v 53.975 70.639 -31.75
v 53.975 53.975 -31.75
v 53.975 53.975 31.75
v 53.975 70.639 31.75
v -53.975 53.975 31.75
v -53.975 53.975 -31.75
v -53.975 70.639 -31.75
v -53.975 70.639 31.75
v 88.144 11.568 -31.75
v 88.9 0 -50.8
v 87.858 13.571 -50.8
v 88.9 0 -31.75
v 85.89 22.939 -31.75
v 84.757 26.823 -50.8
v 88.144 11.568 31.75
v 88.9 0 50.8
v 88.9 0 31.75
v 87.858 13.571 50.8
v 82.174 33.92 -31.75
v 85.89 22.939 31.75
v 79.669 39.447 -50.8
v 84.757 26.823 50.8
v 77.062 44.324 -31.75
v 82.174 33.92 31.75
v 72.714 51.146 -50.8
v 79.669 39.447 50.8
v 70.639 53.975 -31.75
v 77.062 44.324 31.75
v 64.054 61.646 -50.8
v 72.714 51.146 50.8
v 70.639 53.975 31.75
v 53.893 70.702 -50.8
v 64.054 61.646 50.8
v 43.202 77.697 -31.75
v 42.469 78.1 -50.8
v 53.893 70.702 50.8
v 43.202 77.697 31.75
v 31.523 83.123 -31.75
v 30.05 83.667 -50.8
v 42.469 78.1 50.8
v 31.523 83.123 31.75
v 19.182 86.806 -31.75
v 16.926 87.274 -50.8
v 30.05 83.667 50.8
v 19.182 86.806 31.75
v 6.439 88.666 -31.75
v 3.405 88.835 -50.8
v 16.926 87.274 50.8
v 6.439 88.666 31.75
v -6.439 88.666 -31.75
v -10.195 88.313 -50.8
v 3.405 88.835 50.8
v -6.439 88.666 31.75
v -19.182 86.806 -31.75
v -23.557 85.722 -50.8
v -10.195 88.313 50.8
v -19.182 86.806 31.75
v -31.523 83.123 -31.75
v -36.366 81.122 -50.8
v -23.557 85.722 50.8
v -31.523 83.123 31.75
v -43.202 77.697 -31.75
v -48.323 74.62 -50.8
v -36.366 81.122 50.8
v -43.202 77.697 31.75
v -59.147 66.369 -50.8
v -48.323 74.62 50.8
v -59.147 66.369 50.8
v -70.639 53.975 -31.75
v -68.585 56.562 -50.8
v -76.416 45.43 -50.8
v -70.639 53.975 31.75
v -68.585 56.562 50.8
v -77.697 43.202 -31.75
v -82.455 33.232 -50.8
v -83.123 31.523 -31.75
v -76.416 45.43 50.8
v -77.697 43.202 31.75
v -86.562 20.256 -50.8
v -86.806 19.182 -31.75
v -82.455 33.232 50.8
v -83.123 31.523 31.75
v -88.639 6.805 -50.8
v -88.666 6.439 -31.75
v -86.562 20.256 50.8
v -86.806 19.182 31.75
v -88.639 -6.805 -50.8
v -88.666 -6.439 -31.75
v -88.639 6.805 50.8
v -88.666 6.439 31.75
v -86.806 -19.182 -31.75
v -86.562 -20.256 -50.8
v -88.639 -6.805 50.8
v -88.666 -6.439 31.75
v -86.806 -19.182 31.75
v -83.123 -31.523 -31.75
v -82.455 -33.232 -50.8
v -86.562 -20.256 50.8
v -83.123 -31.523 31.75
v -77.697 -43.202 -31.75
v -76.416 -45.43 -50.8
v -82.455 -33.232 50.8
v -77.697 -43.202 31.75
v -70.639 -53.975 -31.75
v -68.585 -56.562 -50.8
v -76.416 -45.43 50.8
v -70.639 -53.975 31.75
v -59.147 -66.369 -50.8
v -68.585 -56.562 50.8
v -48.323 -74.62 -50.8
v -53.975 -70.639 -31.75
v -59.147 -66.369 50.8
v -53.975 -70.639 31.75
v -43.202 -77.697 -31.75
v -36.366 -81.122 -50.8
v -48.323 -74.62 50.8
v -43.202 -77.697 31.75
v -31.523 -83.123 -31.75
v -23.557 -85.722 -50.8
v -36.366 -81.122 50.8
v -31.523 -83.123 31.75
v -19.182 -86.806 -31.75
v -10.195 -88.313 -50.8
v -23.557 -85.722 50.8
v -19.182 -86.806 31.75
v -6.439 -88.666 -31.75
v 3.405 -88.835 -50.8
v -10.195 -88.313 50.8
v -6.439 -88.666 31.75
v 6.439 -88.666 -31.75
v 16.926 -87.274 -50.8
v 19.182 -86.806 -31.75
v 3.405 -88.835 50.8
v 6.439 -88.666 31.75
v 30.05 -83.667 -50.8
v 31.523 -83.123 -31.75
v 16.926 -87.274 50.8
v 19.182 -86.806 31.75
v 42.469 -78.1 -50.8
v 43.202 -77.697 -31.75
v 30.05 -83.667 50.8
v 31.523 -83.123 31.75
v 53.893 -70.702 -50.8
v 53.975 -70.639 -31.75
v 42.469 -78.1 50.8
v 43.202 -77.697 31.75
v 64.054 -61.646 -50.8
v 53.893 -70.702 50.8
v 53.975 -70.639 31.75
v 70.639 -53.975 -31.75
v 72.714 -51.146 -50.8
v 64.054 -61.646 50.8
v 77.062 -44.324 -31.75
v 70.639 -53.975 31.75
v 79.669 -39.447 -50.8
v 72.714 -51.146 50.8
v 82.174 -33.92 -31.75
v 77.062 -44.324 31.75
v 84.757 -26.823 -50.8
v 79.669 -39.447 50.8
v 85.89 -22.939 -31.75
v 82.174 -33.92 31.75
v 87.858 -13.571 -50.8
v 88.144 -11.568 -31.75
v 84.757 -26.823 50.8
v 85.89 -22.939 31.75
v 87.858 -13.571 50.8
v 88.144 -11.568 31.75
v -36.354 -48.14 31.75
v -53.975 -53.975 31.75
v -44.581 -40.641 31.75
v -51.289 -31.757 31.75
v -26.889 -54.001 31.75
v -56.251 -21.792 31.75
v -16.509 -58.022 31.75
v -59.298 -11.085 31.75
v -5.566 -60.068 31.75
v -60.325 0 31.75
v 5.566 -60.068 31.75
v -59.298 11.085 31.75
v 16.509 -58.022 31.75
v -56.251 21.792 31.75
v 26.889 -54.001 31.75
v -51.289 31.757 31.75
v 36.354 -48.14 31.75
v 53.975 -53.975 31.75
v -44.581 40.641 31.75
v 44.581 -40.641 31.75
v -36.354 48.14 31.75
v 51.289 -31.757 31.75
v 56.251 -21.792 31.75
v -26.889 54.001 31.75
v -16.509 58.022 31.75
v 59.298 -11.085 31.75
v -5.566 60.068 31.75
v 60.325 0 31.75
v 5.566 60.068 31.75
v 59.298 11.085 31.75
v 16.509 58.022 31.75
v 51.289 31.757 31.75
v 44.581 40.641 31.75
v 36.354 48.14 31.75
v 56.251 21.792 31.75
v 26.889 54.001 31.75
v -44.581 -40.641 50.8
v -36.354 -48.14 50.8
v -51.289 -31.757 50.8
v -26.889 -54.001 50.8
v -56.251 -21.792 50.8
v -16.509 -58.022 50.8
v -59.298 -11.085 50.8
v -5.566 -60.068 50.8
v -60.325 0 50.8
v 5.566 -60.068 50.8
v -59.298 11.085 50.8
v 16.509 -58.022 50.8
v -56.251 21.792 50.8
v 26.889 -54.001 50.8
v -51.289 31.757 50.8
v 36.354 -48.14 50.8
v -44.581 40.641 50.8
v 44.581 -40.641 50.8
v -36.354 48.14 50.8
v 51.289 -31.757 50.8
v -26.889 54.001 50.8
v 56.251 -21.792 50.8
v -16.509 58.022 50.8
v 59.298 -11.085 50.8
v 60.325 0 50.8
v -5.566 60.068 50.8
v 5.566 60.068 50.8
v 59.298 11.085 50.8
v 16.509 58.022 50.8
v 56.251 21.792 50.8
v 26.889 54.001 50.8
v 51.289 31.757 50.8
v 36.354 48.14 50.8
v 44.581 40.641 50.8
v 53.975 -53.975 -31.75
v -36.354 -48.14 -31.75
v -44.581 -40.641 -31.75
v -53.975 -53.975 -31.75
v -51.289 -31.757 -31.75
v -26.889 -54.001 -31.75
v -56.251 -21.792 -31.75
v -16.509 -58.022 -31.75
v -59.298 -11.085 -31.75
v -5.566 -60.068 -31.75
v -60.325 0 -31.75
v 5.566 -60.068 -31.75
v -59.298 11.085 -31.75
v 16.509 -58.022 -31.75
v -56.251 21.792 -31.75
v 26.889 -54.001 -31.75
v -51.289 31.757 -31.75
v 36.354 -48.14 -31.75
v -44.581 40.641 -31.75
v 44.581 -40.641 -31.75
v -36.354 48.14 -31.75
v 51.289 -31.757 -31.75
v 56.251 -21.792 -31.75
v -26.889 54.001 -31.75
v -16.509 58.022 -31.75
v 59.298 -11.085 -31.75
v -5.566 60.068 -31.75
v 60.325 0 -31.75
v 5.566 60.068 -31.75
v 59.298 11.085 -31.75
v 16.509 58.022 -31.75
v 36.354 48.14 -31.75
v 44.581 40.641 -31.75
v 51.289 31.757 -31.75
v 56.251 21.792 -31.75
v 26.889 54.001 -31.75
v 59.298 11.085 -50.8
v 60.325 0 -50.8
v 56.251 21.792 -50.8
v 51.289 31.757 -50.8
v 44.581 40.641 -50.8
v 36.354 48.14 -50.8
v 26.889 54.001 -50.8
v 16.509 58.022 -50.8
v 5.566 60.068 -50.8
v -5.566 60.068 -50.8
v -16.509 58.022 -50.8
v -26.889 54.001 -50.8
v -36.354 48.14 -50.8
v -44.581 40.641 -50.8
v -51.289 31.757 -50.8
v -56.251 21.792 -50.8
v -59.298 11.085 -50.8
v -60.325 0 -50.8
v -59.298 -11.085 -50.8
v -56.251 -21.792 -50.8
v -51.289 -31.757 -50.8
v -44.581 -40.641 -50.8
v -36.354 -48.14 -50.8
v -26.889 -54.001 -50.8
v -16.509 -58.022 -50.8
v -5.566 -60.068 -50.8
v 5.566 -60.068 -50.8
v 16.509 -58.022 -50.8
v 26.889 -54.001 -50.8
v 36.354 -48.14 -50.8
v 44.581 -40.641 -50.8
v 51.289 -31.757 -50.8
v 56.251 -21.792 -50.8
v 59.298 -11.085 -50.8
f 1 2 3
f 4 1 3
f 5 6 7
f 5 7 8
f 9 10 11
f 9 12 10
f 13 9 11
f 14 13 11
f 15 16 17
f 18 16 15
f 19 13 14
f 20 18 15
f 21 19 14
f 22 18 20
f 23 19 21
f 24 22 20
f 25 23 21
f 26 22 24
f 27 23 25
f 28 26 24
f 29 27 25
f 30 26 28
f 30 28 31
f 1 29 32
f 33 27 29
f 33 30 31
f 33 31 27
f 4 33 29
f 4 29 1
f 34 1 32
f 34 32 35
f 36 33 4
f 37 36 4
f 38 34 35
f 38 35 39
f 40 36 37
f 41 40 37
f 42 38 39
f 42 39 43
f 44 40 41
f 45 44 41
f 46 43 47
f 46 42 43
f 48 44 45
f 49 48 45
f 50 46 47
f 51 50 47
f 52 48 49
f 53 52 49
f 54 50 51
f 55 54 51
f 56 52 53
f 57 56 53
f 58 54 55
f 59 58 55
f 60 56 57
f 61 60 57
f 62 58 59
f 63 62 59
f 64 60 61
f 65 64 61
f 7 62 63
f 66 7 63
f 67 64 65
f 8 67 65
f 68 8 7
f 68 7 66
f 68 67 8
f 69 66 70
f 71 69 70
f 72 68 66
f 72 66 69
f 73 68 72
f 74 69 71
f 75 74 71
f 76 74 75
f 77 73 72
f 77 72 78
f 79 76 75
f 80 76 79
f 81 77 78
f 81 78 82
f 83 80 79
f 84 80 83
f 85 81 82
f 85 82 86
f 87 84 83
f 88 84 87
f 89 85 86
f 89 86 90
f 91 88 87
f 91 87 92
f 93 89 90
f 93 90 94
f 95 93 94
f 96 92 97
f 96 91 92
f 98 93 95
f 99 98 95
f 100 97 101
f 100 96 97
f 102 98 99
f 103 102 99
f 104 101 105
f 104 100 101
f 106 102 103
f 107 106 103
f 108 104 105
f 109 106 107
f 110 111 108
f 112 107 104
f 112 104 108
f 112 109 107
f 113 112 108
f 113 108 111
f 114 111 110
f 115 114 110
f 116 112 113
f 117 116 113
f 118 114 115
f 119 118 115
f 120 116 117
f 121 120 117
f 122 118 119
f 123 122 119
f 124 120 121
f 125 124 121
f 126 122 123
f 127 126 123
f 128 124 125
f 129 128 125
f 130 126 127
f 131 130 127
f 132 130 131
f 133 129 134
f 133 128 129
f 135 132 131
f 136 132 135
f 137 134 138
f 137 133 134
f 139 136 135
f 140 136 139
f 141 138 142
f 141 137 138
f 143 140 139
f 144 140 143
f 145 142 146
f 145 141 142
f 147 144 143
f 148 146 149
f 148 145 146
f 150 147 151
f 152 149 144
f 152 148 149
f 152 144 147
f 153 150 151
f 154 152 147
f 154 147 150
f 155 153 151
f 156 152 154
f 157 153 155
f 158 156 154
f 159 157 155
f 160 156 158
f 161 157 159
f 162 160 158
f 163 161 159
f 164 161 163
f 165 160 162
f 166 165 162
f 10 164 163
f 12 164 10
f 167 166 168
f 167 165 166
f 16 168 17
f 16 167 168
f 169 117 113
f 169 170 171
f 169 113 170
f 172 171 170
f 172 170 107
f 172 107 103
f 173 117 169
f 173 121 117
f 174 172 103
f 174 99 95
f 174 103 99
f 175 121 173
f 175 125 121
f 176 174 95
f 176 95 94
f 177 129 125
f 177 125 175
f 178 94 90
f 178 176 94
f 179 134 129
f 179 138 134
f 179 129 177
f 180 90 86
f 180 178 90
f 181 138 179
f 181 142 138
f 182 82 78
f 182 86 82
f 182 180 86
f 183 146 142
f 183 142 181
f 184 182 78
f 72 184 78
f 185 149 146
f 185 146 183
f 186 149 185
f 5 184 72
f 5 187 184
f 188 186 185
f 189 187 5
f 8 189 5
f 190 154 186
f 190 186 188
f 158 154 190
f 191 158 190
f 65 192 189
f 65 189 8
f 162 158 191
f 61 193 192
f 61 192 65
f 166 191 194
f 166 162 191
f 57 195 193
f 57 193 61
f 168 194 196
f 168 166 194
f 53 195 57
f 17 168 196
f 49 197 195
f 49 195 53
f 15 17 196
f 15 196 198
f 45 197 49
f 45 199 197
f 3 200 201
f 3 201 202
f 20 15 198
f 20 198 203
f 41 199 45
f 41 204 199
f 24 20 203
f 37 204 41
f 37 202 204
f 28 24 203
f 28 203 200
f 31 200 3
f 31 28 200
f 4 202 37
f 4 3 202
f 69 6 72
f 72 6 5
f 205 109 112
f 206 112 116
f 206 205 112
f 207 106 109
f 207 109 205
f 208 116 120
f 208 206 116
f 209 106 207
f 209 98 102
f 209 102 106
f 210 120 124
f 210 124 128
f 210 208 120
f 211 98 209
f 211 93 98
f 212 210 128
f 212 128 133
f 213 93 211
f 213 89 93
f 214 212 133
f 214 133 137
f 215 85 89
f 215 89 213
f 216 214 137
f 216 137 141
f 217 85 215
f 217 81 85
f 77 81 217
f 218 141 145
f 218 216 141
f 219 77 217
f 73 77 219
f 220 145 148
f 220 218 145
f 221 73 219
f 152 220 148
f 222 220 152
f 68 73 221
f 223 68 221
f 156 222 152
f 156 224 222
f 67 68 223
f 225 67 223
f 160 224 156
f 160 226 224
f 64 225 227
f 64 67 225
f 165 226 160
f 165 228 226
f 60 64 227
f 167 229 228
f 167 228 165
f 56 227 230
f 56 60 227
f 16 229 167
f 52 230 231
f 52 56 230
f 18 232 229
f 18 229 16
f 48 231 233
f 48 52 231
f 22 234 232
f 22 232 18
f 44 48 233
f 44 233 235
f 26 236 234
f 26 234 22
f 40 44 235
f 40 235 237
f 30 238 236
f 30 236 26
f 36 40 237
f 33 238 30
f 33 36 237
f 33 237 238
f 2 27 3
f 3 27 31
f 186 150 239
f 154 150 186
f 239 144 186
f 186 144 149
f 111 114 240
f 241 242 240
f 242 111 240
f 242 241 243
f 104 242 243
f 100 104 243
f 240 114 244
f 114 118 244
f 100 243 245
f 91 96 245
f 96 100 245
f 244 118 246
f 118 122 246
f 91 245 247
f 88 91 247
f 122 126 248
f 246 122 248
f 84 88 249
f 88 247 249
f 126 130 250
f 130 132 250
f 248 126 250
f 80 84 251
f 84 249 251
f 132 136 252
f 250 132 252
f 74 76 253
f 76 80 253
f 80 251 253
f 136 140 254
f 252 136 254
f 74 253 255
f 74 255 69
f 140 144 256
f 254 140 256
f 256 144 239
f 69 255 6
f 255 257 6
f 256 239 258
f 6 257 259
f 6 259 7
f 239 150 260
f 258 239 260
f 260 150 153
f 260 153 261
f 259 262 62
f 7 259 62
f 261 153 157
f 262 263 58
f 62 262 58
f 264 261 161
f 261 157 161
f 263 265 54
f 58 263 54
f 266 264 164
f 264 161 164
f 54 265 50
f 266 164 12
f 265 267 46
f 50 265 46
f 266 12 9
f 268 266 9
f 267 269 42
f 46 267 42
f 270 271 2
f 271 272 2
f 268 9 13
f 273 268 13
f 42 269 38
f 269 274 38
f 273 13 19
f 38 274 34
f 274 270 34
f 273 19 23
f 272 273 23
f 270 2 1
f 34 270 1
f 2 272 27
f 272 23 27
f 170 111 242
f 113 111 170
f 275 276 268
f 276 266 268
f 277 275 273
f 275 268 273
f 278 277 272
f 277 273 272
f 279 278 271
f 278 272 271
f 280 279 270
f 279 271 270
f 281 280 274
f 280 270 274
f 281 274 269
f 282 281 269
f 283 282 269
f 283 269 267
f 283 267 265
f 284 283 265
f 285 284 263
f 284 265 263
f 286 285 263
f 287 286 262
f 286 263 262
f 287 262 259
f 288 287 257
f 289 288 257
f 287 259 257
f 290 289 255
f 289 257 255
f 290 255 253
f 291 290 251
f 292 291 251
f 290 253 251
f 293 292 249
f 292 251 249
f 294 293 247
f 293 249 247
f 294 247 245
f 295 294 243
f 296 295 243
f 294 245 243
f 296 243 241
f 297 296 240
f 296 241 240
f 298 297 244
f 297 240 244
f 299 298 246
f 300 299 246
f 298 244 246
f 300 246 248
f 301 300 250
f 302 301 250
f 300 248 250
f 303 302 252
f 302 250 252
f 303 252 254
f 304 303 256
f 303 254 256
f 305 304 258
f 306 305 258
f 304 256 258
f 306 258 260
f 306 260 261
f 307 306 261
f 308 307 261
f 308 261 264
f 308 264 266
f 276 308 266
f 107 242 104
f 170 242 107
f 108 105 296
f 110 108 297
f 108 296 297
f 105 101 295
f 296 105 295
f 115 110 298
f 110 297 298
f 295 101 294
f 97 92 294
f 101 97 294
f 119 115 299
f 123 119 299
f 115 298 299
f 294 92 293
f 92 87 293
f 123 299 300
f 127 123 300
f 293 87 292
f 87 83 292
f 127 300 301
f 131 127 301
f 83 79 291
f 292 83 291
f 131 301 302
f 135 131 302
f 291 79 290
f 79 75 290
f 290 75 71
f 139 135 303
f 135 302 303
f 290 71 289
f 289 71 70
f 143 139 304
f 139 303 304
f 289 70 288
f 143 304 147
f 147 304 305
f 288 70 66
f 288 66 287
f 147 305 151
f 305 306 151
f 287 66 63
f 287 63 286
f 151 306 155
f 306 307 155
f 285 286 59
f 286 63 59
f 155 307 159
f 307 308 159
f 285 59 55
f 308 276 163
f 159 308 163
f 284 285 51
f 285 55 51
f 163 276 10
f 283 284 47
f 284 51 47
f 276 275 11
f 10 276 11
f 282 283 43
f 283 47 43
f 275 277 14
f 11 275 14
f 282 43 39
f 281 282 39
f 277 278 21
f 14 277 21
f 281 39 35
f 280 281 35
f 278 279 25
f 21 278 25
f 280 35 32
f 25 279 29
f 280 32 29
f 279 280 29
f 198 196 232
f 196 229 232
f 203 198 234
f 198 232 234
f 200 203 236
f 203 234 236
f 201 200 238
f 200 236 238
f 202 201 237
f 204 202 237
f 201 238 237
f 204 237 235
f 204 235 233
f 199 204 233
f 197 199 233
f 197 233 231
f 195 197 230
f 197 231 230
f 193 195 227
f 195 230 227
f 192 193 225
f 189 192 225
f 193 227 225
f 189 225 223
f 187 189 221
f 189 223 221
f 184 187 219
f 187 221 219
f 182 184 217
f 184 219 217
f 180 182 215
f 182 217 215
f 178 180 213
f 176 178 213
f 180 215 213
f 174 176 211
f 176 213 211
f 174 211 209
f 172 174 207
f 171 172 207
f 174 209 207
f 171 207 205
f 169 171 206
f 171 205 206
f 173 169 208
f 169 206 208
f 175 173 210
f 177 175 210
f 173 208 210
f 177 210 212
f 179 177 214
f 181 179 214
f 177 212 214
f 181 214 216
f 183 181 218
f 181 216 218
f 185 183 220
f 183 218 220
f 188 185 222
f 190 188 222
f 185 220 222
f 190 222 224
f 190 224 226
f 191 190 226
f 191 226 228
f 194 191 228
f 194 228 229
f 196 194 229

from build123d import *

# Parameters (mm, degrees)
F0_R     = 88.9
F1_DEPTH = 50.8
F2_R     = 60.325
F3_DEPTH = 52.07
F4_W     = 107.95
F4_H     = 63.5
F5_DEPTH = 101.6
F6_W     = 107.95
F6_H     = 63.5
F7_DEPTH = 101.6


with BuildPart() as f1:
    # F0 (on Top) → F1 (new body, symmetric)
    with BuildSketch(Plane.XY):
        Circle(F0_R)
    extrude(amount=F1_DEPTH, both=True)

    # F2 (on Top) → F3 (cut, symmetric)
    with BuildSketch(Plane.XY):
        Circle(F2_R)
    extrude(amount=F3_DEPTH, both=True, mode=Mode.SUBTRACT)

    # F4 (on Front) → F5 (cut, symmetric)
    with BuildSketch(Plane.XZ):
        Rectangle(F4_W, F4_H)
    extrude(amount=F5_DEPTH, both=True, mode=Mode.SUBTRACT)

    # F6 (on Right) → F7 (cut, symmetric)
    with BuildSketch(Plane.YZ):
        Rectangle(F6_W, F6_H)
    extrude(amount=F7_DEPTH, both=True, mode=Mode.SUBTRACT)


solid = f1.part
